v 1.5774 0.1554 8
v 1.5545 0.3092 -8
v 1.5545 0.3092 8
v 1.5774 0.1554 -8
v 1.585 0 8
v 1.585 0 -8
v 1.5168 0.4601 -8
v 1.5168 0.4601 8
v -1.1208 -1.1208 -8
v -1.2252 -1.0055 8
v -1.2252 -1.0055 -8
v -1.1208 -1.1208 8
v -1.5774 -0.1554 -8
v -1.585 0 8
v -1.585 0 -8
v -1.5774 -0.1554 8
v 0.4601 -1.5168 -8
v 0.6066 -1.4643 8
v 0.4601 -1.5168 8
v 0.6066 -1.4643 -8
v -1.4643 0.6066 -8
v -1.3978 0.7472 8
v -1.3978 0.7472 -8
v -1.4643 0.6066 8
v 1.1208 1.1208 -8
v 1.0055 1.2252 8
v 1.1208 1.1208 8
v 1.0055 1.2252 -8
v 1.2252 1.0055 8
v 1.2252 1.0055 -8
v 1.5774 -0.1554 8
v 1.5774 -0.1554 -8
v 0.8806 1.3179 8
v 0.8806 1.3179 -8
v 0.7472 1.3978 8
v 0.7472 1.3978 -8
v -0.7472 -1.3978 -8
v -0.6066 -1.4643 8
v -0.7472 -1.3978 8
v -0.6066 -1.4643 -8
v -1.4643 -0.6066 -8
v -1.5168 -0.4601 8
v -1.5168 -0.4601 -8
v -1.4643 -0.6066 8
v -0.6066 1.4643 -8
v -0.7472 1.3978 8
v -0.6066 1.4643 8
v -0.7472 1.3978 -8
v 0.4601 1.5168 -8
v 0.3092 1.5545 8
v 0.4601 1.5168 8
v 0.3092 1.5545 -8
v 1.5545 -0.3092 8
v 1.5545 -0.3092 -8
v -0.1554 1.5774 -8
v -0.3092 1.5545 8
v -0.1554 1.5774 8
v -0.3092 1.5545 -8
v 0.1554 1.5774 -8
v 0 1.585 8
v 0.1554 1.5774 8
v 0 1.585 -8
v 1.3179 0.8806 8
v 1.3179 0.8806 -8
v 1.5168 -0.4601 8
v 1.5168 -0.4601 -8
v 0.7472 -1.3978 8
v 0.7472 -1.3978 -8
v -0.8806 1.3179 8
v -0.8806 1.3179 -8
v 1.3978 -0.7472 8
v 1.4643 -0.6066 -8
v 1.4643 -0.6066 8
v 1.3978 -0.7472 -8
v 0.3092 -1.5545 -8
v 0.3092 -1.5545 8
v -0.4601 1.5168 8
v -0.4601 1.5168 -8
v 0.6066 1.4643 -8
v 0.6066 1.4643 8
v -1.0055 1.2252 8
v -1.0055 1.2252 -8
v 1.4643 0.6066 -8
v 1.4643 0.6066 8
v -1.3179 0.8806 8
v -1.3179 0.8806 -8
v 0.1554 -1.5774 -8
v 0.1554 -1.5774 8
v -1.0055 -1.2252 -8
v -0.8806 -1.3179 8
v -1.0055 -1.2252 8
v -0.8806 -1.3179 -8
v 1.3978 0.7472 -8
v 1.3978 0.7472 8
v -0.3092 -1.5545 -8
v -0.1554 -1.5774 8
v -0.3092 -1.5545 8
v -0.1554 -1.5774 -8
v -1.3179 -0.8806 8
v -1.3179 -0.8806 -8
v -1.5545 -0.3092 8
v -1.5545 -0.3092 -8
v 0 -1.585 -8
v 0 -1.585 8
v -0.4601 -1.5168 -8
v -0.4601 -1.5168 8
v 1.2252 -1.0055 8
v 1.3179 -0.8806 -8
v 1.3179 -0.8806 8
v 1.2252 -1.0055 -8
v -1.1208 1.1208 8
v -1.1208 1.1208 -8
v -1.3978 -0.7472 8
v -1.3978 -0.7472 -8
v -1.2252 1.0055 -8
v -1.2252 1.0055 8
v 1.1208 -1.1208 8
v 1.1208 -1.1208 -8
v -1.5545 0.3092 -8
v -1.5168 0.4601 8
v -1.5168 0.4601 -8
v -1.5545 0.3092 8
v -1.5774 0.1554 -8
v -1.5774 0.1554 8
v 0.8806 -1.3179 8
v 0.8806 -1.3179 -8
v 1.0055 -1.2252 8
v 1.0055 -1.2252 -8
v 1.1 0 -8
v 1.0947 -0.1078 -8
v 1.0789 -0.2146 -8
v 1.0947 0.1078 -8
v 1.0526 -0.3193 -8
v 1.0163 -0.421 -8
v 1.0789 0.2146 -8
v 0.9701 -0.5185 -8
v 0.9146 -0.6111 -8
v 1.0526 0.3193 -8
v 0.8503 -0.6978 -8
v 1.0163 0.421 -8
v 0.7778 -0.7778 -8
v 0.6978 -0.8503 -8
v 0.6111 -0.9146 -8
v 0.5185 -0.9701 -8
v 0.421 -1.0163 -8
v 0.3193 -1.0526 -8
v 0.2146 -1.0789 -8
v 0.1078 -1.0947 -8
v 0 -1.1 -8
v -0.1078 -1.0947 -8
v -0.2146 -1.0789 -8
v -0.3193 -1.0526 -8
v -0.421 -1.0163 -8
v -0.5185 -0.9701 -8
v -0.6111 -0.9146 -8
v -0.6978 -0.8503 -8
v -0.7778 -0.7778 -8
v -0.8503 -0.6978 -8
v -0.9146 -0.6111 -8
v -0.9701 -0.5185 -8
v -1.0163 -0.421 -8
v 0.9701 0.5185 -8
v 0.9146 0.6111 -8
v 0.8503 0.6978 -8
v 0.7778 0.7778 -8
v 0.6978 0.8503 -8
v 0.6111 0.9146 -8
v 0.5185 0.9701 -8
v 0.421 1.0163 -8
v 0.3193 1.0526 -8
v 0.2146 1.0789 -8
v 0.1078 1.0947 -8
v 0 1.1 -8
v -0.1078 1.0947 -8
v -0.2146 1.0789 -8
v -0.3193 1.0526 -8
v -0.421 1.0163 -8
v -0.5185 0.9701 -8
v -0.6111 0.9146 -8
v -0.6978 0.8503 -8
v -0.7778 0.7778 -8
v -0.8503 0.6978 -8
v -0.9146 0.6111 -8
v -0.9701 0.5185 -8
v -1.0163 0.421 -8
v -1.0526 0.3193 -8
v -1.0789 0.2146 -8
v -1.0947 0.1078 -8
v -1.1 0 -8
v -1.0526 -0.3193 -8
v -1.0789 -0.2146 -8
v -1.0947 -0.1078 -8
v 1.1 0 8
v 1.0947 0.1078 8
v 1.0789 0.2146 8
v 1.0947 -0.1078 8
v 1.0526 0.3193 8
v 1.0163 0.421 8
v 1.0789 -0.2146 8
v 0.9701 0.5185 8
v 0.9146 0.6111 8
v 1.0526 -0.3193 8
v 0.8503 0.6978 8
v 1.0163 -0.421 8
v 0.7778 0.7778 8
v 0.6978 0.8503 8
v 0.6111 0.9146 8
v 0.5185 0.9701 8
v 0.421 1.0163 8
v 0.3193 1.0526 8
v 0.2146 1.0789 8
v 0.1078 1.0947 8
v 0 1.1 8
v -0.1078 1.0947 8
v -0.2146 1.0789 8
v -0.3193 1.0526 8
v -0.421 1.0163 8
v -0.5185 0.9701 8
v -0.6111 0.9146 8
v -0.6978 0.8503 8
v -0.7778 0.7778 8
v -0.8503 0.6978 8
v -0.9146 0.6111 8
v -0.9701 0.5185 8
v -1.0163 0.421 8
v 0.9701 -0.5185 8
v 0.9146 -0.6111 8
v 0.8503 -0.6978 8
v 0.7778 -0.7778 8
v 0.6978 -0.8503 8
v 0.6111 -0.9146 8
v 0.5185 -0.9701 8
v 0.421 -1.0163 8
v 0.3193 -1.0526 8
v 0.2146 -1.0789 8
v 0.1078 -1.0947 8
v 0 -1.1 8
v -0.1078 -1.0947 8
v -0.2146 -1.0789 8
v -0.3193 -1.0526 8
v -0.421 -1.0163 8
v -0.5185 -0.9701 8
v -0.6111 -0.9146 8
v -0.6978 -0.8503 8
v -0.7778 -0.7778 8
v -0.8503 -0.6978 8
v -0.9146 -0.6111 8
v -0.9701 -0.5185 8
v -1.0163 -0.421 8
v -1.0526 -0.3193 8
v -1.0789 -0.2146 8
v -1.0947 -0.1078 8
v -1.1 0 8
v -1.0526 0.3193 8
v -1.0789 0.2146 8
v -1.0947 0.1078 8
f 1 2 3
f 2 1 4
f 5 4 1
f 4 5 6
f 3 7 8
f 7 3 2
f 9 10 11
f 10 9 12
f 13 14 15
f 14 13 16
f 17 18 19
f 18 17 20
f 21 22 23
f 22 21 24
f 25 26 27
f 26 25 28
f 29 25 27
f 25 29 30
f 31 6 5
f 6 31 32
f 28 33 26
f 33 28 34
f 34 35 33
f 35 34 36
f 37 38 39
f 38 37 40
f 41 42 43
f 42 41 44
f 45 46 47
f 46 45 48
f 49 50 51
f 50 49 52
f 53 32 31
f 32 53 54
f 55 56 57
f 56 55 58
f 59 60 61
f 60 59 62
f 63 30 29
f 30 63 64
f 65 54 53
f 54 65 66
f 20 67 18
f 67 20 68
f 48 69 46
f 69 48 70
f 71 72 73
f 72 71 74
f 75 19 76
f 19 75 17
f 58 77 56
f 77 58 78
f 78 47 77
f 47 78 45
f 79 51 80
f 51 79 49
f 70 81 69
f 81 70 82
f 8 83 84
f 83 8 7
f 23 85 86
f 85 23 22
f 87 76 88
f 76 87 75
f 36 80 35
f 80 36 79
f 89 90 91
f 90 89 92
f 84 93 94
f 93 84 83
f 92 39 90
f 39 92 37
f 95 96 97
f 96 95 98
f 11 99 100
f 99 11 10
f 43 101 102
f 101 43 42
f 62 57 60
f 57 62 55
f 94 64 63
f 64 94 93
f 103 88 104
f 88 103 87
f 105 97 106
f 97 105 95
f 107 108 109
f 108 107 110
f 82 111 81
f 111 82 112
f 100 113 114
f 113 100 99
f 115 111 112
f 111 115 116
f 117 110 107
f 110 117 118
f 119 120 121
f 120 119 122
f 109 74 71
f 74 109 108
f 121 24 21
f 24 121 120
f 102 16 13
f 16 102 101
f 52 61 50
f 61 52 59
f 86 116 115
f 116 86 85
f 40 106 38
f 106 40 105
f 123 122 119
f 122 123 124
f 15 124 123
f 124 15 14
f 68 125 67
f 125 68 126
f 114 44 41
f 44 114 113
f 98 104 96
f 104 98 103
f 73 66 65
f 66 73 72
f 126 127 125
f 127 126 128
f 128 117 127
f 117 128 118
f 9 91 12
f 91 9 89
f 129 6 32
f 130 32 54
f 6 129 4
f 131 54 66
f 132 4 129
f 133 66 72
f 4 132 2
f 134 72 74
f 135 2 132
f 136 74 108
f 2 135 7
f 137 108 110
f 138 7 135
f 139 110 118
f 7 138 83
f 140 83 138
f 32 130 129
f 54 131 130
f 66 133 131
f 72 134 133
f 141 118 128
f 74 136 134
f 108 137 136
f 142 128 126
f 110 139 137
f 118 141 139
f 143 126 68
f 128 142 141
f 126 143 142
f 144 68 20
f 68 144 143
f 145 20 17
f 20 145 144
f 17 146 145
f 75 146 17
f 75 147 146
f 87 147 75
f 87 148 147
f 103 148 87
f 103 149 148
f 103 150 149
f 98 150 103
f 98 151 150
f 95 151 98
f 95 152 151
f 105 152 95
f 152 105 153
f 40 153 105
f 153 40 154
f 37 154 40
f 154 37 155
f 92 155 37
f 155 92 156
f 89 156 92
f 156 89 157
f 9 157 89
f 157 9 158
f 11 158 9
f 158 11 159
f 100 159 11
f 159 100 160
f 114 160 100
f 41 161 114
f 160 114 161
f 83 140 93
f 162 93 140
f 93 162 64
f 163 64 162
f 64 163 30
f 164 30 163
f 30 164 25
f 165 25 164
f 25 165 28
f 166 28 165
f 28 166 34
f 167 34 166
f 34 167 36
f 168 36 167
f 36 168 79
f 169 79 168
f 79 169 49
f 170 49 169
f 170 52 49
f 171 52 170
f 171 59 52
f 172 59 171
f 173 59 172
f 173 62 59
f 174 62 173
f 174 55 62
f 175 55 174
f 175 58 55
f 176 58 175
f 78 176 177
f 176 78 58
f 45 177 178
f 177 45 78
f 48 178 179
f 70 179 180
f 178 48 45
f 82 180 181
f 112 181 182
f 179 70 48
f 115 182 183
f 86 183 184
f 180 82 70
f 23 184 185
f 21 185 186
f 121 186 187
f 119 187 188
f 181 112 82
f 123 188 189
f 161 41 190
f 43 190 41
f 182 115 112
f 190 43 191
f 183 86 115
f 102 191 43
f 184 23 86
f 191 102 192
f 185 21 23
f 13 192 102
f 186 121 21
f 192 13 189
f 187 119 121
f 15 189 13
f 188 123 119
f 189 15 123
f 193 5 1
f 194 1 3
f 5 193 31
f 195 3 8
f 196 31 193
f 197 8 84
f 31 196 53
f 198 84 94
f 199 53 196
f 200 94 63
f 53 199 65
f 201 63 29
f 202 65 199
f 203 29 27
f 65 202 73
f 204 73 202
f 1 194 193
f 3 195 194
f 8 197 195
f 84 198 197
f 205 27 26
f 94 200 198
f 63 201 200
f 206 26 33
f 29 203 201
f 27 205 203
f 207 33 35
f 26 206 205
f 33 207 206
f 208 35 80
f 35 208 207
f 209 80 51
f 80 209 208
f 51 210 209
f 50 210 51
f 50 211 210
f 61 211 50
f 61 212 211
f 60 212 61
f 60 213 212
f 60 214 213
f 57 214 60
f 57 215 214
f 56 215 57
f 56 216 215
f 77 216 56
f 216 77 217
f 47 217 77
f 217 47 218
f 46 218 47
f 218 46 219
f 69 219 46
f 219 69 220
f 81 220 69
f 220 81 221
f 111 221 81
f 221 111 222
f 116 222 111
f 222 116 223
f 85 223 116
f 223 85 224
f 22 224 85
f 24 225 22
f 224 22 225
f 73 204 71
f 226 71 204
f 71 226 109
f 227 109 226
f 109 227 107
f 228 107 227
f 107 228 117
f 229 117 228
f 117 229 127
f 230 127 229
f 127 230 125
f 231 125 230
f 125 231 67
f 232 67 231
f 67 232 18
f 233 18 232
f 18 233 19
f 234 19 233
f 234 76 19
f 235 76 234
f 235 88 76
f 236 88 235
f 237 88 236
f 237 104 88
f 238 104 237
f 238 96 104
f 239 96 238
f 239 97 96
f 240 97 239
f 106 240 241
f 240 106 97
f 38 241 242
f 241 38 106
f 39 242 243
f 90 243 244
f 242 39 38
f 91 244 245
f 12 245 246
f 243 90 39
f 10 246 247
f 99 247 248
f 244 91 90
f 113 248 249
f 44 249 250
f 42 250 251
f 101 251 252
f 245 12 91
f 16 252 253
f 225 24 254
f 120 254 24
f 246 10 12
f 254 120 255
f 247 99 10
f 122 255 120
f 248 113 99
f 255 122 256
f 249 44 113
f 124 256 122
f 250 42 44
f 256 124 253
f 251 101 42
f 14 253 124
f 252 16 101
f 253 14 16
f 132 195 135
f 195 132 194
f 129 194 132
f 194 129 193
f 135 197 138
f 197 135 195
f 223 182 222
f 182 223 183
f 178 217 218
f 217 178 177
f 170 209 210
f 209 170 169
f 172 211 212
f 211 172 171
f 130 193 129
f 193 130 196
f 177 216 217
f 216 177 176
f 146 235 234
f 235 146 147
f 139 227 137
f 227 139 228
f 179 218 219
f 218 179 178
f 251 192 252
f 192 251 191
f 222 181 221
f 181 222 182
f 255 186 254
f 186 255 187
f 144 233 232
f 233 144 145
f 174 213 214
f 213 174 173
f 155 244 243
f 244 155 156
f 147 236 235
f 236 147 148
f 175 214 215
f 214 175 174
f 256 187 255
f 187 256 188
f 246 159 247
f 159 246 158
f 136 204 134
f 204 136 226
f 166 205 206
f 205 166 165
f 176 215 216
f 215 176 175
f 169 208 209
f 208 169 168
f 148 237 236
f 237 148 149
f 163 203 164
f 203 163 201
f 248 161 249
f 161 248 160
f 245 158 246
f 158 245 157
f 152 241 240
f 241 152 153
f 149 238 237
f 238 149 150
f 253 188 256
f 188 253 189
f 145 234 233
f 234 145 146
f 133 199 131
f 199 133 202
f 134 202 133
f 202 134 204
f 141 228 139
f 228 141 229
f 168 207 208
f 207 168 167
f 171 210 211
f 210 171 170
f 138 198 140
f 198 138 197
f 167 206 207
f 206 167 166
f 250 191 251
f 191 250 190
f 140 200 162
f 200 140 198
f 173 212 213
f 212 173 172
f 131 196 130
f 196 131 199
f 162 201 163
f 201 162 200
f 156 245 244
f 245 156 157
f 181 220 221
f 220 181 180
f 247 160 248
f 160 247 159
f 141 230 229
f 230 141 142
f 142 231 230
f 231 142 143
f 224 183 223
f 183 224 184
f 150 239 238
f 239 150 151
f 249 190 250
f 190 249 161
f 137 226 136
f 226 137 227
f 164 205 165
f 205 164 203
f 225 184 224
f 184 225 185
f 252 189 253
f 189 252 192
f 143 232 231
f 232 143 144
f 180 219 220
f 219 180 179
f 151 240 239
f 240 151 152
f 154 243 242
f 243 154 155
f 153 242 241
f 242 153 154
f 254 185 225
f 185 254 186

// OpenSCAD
// Parameters
thread_diameter = 2.0; //[1.0:4.0:0.05]
length = 16.0; //[8.0:32.0:0.5]
outer_diameter = 3.17; //[1.585:6.34:0.01]
thread_feature_length = 16.0; //[4.0:32.0:0.5]
thread_hole_extra = 0.2; //[0.0:0.6:0.05]
overlap = 1.0; //[0.5:2.0:0.1]

// Standoff - complete geometry
module standoff() {
  color("Silver") {
    difference() {
      // Pillar body
      cylinder(h=length, r=outer_diameter/2, center=true, $fn=64);
      // M2 thread feature (clearance hole)
      translate([0, 0, 0])
        cylinder(h=thread_feature_length + 2*overlap, r=(thread_diameter + thread_hole_extra)/2, center=true, $fn=64);
    }
  }
}

// Pillar - complete geometry
module pillar() {
  color("DimGray") {
    // Reuse standoff geometry for pillar
    standoff();
  }
}

// Assembly
module assembly() {
  // Place standoff at origin
  standoff();
  // Attach pillar to standoff (same geometry in this case)
  translate([0, 0, 0]) pillar();
}

// Final assembly call
assembly();
